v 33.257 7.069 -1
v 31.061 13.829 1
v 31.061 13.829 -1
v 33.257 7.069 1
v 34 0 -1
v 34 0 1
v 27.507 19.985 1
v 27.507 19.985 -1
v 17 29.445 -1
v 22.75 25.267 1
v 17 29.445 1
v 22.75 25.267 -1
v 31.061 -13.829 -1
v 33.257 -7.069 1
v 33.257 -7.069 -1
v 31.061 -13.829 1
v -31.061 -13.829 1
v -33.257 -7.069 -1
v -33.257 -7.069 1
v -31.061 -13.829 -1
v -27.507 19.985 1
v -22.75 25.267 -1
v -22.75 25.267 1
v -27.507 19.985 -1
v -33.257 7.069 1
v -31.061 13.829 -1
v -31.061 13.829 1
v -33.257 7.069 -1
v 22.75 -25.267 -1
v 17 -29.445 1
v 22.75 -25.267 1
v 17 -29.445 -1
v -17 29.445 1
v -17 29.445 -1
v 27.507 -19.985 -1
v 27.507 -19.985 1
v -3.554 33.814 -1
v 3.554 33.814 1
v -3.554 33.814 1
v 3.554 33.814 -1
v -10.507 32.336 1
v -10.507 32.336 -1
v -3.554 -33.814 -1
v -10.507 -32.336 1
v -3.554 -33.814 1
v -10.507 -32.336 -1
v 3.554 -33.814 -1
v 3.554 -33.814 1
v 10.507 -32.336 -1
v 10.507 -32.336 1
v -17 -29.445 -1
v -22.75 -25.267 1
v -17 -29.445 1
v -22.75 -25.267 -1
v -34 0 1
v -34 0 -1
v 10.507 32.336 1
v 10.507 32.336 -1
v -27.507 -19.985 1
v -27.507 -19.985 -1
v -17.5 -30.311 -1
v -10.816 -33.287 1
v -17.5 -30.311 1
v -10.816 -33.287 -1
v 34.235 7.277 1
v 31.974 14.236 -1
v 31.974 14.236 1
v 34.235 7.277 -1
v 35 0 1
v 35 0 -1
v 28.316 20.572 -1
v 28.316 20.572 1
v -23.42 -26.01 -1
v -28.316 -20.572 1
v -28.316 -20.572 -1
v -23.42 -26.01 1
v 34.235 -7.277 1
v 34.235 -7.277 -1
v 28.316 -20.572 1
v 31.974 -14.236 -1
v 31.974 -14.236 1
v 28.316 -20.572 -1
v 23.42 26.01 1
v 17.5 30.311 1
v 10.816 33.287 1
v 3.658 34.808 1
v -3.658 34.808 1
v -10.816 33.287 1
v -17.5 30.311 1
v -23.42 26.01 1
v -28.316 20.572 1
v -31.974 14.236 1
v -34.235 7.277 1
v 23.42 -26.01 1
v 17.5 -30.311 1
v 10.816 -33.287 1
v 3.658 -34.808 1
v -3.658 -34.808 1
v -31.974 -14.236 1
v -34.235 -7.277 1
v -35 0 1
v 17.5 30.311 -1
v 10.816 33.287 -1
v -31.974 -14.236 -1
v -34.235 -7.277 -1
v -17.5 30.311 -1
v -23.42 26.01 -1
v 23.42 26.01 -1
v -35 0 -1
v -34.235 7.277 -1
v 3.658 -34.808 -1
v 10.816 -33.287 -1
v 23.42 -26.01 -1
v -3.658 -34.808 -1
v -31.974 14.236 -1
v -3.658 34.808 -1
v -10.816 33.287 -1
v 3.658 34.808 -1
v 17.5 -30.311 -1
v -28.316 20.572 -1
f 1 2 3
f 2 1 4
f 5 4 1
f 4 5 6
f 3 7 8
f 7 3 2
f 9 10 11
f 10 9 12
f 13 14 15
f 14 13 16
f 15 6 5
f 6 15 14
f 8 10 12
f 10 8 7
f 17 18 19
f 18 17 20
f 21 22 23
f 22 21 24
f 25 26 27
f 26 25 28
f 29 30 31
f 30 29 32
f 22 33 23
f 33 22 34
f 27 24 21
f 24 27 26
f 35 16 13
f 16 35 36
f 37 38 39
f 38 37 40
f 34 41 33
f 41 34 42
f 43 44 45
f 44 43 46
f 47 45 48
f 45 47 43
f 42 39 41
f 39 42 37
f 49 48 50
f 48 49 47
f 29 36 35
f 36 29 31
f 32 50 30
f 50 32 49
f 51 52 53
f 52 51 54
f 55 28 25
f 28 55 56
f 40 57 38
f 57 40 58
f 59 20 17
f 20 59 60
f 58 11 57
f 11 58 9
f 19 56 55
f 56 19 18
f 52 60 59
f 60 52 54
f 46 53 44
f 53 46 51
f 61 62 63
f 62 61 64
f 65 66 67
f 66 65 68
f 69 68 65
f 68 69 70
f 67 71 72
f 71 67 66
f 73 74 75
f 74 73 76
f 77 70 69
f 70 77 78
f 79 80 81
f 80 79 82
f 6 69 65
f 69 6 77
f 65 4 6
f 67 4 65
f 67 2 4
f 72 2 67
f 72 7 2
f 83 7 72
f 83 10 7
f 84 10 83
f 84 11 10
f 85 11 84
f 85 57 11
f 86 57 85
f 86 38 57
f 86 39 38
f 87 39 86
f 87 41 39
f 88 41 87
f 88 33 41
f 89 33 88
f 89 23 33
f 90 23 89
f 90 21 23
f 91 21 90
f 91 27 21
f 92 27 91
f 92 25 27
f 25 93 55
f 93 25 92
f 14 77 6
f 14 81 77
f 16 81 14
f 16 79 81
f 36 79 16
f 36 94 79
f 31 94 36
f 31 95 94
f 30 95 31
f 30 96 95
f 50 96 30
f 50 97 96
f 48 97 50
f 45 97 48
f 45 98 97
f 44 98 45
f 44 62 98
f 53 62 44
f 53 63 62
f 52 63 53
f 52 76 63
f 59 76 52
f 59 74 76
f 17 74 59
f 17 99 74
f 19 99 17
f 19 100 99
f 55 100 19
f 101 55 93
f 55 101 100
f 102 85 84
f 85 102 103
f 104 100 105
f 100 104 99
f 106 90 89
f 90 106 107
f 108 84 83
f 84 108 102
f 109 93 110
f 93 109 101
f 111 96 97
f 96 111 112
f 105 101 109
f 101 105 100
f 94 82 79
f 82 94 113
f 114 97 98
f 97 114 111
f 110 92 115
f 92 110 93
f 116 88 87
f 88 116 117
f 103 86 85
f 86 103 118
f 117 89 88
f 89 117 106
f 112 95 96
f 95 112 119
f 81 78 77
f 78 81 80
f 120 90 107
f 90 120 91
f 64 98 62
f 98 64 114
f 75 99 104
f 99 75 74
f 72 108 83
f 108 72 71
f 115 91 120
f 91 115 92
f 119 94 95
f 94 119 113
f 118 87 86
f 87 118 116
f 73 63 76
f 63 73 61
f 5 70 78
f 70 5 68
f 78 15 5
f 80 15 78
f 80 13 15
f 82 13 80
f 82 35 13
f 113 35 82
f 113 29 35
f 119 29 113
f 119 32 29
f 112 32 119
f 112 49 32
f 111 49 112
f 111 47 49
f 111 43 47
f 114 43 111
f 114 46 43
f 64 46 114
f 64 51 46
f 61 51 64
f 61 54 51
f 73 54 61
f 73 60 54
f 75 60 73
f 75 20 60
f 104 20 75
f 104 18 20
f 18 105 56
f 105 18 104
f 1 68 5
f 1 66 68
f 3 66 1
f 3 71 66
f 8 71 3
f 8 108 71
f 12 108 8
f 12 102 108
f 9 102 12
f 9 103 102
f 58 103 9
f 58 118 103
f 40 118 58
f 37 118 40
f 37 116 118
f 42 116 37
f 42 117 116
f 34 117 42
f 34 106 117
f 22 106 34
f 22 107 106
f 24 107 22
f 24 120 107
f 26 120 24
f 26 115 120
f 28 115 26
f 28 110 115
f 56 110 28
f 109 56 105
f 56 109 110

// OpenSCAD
//Author: Lucia Prieto Godino
//mail: lucia.prieto@cantab.net
//February 2016
//Cover tubes behaviour

// Customazible variables

// height
height = 2; 
// diameter
diameter = 35; 

////////////////////////////////////////////////////////
module customizer_off(){};
////////////////////////////////////////////////////////

h1= height;
r1= diameter;
r2 = r1 -1;
h2 = 6 + h1;

module Base() {
cylinder(h= h1, r = r1, center = true);
}

//Base();

module inside() {
cylinder ( h = h2, r = r2, centre = true);
 translate ([0,0,-h2/2]){cylinder ( h = h2, r = r2, centre = true);}
}

//inside();

module final() {
difference () {Base() ; inside();}
}

final();
